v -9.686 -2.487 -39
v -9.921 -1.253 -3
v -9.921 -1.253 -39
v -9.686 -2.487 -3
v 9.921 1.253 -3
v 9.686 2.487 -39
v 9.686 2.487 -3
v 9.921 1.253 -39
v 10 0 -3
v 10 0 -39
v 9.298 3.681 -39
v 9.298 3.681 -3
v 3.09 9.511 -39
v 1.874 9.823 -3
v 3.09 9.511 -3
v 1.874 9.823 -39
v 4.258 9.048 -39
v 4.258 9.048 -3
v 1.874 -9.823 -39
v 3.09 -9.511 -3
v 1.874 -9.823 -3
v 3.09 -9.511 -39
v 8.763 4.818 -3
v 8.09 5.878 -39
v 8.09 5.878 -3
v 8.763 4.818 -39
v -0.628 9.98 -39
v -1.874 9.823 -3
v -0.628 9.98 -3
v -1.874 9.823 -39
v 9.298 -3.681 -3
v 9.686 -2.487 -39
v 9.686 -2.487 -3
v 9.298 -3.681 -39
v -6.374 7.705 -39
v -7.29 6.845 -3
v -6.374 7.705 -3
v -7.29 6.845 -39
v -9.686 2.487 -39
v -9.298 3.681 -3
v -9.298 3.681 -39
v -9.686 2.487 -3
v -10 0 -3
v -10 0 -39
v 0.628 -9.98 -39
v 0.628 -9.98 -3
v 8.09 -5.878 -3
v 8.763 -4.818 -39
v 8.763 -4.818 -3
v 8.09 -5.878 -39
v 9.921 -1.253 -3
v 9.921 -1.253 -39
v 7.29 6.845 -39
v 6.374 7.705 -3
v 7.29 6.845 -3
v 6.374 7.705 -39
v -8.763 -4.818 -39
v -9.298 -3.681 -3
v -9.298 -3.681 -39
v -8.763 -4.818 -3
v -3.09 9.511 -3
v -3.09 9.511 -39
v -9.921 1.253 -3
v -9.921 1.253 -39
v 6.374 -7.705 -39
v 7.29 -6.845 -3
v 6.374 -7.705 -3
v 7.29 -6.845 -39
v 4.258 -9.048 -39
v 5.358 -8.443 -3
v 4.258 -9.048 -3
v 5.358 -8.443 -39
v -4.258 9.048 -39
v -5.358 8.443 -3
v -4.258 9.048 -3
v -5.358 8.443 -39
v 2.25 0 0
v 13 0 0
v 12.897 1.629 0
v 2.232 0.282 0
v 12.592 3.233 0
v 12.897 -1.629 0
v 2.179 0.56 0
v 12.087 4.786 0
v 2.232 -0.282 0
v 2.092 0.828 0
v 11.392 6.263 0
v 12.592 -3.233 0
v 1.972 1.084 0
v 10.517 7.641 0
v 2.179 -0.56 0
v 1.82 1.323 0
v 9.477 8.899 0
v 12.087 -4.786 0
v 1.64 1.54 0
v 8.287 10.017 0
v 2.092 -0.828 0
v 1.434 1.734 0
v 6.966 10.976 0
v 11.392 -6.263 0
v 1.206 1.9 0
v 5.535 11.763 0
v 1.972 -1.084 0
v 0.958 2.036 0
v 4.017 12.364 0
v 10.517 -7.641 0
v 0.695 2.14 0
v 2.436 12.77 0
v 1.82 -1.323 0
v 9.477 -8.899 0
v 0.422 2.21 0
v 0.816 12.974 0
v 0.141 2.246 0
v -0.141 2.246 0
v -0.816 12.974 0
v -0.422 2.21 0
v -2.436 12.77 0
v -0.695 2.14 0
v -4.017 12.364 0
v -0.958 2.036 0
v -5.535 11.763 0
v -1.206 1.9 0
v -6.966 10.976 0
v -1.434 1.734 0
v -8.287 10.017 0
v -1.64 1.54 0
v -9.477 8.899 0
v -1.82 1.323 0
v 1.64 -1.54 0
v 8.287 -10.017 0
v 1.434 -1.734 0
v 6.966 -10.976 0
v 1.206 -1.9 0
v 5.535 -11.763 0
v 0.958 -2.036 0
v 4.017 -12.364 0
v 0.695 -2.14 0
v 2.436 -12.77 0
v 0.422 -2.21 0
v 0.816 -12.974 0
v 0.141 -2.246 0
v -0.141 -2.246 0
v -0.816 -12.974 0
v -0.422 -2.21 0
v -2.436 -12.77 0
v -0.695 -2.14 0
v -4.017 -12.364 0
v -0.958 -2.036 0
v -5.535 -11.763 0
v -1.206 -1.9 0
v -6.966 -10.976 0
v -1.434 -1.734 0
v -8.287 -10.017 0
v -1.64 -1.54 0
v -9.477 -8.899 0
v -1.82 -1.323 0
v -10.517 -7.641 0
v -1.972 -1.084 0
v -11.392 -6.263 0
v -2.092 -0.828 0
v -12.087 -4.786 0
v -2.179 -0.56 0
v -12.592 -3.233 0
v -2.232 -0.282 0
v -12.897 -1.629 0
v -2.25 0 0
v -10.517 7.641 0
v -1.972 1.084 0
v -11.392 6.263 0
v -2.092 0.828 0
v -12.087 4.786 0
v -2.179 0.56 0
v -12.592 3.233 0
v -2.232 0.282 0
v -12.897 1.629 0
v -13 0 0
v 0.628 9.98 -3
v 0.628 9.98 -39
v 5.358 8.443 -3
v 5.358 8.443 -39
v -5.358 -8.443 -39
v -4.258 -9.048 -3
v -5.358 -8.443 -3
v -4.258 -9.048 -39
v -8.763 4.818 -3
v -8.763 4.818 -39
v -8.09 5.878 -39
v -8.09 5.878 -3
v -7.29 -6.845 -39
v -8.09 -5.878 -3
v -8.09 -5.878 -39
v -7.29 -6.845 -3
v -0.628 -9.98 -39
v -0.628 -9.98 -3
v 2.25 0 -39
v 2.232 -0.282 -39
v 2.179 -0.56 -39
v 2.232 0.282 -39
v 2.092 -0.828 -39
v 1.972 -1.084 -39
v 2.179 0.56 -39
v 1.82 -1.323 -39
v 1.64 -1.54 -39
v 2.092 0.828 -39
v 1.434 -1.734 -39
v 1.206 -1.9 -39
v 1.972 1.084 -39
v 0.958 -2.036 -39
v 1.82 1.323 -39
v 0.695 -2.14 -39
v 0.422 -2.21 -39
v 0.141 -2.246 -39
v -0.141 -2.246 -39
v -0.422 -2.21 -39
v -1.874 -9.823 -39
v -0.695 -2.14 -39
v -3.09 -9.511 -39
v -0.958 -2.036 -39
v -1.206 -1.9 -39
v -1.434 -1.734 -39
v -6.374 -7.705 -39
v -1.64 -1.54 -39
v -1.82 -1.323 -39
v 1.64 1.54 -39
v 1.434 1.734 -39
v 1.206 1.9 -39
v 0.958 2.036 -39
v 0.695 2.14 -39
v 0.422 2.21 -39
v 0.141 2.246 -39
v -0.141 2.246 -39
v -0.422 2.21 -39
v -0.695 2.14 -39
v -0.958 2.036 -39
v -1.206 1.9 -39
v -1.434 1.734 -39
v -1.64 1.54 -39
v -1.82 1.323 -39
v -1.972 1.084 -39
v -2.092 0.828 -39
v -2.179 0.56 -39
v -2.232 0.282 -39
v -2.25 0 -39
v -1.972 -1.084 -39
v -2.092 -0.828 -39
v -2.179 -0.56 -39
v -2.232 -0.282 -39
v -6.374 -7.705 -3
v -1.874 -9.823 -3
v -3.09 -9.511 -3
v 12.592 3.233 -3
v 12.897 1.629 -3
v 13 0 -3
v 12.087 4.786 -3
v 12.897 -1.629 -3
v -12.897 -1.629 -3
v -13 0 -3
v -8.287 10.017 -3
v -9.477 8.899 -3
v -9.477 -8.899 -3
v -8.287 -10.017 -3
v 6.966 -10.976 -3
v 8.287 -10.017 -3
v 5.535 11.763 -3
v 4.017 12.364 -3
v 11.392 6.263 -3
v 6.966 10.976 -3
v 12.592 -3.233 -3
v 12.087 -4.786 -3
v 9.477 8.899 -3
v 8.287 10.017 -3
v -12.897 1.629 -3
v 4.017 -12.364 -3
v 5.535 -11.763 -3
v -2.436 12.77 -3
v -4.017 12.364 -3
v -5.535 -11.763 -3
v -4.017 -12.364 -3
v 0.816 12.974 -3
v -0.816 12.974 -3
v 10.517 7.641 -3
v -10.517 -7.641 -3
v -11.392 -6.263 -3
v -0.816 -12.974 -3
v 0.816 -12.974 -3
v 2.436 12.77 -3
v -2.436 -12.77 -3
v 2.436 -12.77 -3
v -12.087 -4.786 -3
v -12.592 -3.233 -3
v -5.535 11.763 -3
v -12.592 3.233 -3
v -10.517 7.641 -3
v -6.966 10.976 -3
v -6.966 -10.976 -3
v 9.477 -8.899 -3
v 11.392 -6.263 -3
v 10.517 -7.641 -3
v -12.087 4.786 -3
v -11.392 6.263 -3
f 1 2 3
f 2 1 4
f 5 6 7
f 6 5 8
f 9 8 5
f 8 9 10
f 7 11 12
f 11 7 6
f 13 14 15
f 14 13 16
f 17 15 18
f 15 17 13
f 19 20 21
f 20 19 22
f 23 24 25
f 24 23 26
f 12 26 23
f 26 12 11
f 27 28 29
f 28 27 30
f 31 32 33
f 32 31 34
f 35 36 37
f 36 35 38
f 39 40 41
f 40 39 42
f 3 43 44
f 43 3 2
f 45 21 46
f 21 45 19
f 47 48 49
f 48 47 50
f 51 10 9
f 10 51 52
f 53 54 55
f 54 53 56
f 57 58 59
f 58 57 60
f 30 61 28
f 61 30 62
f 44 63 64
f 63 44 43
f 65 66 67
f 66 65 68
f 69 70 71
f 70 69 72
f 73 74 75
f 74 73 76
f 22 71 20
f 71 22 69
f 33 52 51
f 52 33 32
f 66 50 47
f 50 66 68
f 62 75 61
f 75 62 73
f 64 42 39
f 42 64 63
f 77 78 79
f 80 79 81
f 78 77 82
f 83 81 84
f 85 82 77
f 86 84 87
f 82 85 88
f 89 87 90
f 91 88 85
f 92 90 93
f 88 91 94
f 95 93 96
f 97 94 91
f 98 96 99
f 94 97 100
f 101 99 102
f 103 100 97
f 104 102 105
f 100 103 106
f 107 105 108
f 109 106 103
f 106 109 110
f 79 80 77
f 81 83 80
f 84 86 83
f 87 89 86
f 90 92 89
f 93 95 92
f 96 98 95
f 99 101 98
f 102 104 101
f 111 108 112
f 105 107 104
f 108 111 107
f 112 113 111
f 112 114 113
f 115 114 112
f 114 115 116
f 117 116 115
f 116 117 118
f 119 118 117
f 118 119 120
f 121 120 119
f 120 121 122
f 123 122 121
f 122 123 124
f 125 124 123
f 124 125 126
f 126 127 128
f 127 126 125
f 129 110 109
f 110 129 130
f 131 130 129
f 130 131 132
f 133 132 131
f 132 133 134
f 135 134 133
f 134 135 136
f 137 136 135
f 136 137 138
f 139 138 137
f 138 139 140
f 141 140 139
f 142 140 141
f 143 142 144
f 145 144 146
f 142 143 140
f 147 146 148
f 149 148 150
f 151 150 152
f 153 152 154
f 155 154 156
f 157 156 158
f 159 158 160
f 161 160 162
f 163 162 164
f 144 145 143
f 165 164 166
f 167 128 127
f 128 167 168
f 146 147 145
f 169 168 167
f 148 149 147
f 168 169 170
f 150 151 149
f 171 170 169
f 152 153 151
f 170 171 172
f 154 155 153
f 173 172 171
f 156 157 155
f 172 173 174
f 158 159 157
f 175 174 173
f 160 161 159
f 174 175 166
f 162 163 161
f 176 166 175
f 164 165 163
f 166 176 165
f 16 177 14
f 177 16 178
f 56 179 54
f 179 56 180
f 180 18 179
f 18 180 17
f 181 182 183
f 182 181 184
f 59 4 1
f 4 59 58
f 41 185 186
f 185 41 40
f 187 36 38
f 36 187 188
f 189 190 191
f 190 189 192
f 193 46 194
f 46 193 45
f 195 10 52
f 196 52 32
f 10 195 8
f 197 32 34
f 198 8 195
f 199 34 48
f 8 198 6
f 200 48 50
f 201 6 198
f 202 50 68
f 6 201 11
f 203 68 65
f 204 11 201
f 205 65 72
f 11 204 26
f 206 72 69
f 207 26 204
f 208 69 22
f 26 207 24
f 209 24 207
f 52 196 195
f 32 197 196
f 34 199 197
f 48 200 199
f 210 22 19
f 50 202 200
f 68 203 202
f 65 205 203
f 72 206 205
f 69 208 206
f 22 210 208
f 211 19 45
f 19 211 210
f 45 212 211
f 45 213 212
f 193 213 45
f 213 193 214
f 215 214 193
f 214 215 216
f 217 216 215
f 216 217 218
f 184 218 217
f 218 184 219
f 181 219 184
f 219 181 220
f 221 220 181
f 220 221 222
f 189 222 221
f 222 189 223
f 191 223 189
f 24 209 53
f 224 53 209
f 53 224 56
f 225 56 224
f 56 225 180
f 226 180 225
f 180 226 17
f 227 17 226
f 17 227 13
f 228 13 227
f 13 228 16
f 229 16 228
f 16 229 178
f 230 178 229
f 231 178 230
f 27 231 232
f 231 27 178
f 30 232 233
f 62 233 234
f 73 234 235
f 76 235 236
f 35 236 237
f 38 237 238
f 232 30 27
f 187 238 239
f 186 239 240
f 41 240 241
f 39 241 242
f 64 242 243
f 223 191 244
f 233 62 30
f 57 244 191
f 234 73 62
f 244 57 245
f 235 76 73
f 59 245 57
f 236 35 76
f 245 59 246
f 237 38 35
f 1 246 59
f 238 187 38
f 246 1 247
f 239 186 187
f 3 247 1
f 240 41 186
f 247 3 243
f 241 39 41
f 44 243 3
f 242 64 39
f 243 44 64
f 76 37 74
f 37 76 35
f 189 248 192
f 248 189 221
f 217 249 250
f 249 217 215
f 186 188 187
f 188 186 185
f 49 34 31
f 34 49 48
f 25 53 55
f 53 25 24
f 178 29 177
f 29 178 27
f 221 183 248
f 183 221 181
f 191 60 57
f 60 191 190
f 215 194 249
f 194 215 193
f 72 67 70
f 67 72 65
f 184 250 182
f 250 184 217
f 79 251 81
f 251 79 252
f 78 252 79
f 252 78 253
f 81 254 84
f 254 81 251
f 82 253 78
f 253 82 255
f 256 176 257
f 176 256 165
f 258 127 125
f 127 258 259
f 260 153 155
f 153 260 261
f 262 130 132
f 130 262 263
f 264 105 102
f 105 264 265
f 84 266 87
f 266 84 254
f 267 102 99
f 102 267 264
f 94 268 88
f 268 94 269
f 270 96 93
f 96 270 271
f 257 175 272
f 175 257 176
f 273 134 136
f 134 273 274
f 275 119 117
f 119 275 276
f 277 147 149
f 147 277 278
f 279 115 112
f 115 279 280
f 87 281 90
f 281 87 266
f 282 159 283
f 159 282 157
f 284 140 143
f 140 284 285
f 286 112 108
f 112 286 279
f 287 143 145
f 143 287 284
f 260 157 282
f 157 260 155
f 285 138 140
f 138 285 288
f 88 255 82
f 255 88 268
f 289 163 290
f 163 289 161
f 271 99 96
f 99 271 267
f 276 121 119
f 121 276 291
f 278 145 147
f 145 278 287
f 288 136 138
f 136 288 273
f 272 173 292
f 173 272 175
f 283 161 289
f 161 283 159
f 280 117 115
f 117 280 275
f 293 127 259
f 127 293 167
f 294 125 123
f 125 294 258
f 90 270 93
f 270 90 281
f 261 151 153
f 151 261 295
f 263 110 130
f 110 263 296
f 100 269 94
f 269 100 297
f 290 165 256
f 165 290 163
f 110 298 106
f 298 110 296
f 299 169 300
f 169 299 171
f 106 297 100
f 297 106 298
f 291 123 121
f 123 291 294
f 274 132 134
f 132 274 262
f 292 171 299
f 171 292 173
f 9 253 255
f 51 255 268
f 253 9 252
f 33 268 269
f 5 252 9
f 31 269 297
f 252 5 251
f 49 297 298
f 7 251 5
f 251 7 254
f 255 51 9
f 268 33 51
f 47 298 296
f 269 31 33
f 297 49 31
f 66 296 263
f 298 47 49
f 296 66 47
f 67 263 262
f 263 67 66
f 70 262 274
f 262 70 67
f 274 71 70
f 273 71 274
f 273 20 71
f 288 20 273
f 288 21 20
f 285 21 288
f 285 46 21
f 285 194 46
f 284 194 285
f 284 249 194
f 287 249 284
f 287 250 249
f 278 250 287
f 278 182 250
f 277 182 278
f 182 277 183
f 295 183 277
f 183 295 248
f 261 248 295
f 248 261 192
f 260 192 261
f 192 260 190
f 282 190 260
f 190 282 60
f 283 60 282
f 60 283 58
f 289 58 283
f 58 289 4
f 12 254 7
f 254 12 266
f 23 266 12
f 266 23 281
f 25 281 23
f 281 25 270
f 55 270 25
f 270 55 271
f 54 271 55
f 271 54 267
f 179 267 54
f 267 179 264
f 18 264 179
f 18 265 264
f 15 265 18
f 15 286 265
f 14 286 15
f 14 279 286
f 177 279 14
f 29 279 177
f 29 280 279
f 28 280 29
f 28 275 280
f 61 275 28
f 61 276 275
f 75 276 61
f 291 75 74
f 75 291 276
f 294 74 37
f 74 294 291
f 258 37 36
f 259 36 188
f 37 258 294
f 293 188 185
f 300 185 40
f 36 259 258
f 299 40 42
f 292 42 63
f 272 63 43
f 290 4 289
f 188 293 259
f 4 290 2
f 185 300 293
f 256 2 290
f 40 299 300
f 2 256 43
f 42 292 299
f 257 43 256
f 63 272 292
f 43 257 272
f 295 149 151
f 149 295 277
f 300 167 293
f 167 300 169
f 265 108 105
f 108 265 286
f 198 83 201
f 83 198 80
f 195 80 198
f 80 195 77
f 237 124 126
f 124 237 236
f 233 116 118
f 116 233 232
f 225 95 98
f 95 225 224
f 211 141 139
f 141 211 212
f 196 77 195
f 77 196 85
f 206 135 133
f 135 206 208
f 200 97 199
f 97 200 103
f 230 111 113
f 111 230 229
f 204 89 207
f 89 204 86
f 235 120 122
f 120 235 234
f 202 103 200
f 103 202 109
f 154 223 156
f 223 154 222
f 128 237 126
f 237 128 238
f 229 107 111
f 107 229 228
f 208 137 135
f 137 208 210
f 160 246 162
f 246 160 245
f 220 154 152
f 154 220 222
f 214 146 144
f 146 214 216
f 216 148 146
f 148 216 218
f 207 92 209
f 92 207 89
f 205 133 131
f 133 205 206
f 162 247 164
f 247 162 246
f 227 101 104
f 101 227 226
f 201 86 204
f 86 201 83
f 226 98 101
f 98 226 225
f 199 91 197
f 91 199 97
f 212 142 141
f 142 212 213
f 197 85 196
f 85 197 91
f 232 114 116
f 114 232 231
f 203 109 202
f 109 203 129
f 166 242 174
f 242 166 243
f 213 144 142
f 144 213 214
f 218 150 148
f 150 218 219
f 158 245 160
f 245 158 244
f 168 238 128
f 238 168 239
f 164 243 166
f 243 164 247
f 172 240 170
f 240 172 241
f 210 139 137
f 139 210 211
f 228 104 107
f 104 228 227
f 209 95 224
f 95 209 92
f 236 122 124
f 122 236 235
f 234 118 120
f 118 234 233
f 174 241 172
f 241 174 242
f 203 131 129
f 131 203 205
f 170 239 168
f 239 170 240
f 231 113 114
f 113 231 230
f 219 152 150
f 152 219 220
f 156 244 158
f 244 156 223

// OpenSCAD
$fn = 50;


difference() {
	union() {
		translate(v = [0, 0, -39.0000000000]) {
			cylinder(h = 39, r = 10.0000000000);
		}
		translate(v = [0, 0, -3.0000000000]) {
			cylinder(h = 3, r = 13.0000000000);
		}
	}
	union() {
		#translate(v = [0, 0, -39]) {
			cylinder(h = 39, r = 2.2500000000);
		}
	}
}
